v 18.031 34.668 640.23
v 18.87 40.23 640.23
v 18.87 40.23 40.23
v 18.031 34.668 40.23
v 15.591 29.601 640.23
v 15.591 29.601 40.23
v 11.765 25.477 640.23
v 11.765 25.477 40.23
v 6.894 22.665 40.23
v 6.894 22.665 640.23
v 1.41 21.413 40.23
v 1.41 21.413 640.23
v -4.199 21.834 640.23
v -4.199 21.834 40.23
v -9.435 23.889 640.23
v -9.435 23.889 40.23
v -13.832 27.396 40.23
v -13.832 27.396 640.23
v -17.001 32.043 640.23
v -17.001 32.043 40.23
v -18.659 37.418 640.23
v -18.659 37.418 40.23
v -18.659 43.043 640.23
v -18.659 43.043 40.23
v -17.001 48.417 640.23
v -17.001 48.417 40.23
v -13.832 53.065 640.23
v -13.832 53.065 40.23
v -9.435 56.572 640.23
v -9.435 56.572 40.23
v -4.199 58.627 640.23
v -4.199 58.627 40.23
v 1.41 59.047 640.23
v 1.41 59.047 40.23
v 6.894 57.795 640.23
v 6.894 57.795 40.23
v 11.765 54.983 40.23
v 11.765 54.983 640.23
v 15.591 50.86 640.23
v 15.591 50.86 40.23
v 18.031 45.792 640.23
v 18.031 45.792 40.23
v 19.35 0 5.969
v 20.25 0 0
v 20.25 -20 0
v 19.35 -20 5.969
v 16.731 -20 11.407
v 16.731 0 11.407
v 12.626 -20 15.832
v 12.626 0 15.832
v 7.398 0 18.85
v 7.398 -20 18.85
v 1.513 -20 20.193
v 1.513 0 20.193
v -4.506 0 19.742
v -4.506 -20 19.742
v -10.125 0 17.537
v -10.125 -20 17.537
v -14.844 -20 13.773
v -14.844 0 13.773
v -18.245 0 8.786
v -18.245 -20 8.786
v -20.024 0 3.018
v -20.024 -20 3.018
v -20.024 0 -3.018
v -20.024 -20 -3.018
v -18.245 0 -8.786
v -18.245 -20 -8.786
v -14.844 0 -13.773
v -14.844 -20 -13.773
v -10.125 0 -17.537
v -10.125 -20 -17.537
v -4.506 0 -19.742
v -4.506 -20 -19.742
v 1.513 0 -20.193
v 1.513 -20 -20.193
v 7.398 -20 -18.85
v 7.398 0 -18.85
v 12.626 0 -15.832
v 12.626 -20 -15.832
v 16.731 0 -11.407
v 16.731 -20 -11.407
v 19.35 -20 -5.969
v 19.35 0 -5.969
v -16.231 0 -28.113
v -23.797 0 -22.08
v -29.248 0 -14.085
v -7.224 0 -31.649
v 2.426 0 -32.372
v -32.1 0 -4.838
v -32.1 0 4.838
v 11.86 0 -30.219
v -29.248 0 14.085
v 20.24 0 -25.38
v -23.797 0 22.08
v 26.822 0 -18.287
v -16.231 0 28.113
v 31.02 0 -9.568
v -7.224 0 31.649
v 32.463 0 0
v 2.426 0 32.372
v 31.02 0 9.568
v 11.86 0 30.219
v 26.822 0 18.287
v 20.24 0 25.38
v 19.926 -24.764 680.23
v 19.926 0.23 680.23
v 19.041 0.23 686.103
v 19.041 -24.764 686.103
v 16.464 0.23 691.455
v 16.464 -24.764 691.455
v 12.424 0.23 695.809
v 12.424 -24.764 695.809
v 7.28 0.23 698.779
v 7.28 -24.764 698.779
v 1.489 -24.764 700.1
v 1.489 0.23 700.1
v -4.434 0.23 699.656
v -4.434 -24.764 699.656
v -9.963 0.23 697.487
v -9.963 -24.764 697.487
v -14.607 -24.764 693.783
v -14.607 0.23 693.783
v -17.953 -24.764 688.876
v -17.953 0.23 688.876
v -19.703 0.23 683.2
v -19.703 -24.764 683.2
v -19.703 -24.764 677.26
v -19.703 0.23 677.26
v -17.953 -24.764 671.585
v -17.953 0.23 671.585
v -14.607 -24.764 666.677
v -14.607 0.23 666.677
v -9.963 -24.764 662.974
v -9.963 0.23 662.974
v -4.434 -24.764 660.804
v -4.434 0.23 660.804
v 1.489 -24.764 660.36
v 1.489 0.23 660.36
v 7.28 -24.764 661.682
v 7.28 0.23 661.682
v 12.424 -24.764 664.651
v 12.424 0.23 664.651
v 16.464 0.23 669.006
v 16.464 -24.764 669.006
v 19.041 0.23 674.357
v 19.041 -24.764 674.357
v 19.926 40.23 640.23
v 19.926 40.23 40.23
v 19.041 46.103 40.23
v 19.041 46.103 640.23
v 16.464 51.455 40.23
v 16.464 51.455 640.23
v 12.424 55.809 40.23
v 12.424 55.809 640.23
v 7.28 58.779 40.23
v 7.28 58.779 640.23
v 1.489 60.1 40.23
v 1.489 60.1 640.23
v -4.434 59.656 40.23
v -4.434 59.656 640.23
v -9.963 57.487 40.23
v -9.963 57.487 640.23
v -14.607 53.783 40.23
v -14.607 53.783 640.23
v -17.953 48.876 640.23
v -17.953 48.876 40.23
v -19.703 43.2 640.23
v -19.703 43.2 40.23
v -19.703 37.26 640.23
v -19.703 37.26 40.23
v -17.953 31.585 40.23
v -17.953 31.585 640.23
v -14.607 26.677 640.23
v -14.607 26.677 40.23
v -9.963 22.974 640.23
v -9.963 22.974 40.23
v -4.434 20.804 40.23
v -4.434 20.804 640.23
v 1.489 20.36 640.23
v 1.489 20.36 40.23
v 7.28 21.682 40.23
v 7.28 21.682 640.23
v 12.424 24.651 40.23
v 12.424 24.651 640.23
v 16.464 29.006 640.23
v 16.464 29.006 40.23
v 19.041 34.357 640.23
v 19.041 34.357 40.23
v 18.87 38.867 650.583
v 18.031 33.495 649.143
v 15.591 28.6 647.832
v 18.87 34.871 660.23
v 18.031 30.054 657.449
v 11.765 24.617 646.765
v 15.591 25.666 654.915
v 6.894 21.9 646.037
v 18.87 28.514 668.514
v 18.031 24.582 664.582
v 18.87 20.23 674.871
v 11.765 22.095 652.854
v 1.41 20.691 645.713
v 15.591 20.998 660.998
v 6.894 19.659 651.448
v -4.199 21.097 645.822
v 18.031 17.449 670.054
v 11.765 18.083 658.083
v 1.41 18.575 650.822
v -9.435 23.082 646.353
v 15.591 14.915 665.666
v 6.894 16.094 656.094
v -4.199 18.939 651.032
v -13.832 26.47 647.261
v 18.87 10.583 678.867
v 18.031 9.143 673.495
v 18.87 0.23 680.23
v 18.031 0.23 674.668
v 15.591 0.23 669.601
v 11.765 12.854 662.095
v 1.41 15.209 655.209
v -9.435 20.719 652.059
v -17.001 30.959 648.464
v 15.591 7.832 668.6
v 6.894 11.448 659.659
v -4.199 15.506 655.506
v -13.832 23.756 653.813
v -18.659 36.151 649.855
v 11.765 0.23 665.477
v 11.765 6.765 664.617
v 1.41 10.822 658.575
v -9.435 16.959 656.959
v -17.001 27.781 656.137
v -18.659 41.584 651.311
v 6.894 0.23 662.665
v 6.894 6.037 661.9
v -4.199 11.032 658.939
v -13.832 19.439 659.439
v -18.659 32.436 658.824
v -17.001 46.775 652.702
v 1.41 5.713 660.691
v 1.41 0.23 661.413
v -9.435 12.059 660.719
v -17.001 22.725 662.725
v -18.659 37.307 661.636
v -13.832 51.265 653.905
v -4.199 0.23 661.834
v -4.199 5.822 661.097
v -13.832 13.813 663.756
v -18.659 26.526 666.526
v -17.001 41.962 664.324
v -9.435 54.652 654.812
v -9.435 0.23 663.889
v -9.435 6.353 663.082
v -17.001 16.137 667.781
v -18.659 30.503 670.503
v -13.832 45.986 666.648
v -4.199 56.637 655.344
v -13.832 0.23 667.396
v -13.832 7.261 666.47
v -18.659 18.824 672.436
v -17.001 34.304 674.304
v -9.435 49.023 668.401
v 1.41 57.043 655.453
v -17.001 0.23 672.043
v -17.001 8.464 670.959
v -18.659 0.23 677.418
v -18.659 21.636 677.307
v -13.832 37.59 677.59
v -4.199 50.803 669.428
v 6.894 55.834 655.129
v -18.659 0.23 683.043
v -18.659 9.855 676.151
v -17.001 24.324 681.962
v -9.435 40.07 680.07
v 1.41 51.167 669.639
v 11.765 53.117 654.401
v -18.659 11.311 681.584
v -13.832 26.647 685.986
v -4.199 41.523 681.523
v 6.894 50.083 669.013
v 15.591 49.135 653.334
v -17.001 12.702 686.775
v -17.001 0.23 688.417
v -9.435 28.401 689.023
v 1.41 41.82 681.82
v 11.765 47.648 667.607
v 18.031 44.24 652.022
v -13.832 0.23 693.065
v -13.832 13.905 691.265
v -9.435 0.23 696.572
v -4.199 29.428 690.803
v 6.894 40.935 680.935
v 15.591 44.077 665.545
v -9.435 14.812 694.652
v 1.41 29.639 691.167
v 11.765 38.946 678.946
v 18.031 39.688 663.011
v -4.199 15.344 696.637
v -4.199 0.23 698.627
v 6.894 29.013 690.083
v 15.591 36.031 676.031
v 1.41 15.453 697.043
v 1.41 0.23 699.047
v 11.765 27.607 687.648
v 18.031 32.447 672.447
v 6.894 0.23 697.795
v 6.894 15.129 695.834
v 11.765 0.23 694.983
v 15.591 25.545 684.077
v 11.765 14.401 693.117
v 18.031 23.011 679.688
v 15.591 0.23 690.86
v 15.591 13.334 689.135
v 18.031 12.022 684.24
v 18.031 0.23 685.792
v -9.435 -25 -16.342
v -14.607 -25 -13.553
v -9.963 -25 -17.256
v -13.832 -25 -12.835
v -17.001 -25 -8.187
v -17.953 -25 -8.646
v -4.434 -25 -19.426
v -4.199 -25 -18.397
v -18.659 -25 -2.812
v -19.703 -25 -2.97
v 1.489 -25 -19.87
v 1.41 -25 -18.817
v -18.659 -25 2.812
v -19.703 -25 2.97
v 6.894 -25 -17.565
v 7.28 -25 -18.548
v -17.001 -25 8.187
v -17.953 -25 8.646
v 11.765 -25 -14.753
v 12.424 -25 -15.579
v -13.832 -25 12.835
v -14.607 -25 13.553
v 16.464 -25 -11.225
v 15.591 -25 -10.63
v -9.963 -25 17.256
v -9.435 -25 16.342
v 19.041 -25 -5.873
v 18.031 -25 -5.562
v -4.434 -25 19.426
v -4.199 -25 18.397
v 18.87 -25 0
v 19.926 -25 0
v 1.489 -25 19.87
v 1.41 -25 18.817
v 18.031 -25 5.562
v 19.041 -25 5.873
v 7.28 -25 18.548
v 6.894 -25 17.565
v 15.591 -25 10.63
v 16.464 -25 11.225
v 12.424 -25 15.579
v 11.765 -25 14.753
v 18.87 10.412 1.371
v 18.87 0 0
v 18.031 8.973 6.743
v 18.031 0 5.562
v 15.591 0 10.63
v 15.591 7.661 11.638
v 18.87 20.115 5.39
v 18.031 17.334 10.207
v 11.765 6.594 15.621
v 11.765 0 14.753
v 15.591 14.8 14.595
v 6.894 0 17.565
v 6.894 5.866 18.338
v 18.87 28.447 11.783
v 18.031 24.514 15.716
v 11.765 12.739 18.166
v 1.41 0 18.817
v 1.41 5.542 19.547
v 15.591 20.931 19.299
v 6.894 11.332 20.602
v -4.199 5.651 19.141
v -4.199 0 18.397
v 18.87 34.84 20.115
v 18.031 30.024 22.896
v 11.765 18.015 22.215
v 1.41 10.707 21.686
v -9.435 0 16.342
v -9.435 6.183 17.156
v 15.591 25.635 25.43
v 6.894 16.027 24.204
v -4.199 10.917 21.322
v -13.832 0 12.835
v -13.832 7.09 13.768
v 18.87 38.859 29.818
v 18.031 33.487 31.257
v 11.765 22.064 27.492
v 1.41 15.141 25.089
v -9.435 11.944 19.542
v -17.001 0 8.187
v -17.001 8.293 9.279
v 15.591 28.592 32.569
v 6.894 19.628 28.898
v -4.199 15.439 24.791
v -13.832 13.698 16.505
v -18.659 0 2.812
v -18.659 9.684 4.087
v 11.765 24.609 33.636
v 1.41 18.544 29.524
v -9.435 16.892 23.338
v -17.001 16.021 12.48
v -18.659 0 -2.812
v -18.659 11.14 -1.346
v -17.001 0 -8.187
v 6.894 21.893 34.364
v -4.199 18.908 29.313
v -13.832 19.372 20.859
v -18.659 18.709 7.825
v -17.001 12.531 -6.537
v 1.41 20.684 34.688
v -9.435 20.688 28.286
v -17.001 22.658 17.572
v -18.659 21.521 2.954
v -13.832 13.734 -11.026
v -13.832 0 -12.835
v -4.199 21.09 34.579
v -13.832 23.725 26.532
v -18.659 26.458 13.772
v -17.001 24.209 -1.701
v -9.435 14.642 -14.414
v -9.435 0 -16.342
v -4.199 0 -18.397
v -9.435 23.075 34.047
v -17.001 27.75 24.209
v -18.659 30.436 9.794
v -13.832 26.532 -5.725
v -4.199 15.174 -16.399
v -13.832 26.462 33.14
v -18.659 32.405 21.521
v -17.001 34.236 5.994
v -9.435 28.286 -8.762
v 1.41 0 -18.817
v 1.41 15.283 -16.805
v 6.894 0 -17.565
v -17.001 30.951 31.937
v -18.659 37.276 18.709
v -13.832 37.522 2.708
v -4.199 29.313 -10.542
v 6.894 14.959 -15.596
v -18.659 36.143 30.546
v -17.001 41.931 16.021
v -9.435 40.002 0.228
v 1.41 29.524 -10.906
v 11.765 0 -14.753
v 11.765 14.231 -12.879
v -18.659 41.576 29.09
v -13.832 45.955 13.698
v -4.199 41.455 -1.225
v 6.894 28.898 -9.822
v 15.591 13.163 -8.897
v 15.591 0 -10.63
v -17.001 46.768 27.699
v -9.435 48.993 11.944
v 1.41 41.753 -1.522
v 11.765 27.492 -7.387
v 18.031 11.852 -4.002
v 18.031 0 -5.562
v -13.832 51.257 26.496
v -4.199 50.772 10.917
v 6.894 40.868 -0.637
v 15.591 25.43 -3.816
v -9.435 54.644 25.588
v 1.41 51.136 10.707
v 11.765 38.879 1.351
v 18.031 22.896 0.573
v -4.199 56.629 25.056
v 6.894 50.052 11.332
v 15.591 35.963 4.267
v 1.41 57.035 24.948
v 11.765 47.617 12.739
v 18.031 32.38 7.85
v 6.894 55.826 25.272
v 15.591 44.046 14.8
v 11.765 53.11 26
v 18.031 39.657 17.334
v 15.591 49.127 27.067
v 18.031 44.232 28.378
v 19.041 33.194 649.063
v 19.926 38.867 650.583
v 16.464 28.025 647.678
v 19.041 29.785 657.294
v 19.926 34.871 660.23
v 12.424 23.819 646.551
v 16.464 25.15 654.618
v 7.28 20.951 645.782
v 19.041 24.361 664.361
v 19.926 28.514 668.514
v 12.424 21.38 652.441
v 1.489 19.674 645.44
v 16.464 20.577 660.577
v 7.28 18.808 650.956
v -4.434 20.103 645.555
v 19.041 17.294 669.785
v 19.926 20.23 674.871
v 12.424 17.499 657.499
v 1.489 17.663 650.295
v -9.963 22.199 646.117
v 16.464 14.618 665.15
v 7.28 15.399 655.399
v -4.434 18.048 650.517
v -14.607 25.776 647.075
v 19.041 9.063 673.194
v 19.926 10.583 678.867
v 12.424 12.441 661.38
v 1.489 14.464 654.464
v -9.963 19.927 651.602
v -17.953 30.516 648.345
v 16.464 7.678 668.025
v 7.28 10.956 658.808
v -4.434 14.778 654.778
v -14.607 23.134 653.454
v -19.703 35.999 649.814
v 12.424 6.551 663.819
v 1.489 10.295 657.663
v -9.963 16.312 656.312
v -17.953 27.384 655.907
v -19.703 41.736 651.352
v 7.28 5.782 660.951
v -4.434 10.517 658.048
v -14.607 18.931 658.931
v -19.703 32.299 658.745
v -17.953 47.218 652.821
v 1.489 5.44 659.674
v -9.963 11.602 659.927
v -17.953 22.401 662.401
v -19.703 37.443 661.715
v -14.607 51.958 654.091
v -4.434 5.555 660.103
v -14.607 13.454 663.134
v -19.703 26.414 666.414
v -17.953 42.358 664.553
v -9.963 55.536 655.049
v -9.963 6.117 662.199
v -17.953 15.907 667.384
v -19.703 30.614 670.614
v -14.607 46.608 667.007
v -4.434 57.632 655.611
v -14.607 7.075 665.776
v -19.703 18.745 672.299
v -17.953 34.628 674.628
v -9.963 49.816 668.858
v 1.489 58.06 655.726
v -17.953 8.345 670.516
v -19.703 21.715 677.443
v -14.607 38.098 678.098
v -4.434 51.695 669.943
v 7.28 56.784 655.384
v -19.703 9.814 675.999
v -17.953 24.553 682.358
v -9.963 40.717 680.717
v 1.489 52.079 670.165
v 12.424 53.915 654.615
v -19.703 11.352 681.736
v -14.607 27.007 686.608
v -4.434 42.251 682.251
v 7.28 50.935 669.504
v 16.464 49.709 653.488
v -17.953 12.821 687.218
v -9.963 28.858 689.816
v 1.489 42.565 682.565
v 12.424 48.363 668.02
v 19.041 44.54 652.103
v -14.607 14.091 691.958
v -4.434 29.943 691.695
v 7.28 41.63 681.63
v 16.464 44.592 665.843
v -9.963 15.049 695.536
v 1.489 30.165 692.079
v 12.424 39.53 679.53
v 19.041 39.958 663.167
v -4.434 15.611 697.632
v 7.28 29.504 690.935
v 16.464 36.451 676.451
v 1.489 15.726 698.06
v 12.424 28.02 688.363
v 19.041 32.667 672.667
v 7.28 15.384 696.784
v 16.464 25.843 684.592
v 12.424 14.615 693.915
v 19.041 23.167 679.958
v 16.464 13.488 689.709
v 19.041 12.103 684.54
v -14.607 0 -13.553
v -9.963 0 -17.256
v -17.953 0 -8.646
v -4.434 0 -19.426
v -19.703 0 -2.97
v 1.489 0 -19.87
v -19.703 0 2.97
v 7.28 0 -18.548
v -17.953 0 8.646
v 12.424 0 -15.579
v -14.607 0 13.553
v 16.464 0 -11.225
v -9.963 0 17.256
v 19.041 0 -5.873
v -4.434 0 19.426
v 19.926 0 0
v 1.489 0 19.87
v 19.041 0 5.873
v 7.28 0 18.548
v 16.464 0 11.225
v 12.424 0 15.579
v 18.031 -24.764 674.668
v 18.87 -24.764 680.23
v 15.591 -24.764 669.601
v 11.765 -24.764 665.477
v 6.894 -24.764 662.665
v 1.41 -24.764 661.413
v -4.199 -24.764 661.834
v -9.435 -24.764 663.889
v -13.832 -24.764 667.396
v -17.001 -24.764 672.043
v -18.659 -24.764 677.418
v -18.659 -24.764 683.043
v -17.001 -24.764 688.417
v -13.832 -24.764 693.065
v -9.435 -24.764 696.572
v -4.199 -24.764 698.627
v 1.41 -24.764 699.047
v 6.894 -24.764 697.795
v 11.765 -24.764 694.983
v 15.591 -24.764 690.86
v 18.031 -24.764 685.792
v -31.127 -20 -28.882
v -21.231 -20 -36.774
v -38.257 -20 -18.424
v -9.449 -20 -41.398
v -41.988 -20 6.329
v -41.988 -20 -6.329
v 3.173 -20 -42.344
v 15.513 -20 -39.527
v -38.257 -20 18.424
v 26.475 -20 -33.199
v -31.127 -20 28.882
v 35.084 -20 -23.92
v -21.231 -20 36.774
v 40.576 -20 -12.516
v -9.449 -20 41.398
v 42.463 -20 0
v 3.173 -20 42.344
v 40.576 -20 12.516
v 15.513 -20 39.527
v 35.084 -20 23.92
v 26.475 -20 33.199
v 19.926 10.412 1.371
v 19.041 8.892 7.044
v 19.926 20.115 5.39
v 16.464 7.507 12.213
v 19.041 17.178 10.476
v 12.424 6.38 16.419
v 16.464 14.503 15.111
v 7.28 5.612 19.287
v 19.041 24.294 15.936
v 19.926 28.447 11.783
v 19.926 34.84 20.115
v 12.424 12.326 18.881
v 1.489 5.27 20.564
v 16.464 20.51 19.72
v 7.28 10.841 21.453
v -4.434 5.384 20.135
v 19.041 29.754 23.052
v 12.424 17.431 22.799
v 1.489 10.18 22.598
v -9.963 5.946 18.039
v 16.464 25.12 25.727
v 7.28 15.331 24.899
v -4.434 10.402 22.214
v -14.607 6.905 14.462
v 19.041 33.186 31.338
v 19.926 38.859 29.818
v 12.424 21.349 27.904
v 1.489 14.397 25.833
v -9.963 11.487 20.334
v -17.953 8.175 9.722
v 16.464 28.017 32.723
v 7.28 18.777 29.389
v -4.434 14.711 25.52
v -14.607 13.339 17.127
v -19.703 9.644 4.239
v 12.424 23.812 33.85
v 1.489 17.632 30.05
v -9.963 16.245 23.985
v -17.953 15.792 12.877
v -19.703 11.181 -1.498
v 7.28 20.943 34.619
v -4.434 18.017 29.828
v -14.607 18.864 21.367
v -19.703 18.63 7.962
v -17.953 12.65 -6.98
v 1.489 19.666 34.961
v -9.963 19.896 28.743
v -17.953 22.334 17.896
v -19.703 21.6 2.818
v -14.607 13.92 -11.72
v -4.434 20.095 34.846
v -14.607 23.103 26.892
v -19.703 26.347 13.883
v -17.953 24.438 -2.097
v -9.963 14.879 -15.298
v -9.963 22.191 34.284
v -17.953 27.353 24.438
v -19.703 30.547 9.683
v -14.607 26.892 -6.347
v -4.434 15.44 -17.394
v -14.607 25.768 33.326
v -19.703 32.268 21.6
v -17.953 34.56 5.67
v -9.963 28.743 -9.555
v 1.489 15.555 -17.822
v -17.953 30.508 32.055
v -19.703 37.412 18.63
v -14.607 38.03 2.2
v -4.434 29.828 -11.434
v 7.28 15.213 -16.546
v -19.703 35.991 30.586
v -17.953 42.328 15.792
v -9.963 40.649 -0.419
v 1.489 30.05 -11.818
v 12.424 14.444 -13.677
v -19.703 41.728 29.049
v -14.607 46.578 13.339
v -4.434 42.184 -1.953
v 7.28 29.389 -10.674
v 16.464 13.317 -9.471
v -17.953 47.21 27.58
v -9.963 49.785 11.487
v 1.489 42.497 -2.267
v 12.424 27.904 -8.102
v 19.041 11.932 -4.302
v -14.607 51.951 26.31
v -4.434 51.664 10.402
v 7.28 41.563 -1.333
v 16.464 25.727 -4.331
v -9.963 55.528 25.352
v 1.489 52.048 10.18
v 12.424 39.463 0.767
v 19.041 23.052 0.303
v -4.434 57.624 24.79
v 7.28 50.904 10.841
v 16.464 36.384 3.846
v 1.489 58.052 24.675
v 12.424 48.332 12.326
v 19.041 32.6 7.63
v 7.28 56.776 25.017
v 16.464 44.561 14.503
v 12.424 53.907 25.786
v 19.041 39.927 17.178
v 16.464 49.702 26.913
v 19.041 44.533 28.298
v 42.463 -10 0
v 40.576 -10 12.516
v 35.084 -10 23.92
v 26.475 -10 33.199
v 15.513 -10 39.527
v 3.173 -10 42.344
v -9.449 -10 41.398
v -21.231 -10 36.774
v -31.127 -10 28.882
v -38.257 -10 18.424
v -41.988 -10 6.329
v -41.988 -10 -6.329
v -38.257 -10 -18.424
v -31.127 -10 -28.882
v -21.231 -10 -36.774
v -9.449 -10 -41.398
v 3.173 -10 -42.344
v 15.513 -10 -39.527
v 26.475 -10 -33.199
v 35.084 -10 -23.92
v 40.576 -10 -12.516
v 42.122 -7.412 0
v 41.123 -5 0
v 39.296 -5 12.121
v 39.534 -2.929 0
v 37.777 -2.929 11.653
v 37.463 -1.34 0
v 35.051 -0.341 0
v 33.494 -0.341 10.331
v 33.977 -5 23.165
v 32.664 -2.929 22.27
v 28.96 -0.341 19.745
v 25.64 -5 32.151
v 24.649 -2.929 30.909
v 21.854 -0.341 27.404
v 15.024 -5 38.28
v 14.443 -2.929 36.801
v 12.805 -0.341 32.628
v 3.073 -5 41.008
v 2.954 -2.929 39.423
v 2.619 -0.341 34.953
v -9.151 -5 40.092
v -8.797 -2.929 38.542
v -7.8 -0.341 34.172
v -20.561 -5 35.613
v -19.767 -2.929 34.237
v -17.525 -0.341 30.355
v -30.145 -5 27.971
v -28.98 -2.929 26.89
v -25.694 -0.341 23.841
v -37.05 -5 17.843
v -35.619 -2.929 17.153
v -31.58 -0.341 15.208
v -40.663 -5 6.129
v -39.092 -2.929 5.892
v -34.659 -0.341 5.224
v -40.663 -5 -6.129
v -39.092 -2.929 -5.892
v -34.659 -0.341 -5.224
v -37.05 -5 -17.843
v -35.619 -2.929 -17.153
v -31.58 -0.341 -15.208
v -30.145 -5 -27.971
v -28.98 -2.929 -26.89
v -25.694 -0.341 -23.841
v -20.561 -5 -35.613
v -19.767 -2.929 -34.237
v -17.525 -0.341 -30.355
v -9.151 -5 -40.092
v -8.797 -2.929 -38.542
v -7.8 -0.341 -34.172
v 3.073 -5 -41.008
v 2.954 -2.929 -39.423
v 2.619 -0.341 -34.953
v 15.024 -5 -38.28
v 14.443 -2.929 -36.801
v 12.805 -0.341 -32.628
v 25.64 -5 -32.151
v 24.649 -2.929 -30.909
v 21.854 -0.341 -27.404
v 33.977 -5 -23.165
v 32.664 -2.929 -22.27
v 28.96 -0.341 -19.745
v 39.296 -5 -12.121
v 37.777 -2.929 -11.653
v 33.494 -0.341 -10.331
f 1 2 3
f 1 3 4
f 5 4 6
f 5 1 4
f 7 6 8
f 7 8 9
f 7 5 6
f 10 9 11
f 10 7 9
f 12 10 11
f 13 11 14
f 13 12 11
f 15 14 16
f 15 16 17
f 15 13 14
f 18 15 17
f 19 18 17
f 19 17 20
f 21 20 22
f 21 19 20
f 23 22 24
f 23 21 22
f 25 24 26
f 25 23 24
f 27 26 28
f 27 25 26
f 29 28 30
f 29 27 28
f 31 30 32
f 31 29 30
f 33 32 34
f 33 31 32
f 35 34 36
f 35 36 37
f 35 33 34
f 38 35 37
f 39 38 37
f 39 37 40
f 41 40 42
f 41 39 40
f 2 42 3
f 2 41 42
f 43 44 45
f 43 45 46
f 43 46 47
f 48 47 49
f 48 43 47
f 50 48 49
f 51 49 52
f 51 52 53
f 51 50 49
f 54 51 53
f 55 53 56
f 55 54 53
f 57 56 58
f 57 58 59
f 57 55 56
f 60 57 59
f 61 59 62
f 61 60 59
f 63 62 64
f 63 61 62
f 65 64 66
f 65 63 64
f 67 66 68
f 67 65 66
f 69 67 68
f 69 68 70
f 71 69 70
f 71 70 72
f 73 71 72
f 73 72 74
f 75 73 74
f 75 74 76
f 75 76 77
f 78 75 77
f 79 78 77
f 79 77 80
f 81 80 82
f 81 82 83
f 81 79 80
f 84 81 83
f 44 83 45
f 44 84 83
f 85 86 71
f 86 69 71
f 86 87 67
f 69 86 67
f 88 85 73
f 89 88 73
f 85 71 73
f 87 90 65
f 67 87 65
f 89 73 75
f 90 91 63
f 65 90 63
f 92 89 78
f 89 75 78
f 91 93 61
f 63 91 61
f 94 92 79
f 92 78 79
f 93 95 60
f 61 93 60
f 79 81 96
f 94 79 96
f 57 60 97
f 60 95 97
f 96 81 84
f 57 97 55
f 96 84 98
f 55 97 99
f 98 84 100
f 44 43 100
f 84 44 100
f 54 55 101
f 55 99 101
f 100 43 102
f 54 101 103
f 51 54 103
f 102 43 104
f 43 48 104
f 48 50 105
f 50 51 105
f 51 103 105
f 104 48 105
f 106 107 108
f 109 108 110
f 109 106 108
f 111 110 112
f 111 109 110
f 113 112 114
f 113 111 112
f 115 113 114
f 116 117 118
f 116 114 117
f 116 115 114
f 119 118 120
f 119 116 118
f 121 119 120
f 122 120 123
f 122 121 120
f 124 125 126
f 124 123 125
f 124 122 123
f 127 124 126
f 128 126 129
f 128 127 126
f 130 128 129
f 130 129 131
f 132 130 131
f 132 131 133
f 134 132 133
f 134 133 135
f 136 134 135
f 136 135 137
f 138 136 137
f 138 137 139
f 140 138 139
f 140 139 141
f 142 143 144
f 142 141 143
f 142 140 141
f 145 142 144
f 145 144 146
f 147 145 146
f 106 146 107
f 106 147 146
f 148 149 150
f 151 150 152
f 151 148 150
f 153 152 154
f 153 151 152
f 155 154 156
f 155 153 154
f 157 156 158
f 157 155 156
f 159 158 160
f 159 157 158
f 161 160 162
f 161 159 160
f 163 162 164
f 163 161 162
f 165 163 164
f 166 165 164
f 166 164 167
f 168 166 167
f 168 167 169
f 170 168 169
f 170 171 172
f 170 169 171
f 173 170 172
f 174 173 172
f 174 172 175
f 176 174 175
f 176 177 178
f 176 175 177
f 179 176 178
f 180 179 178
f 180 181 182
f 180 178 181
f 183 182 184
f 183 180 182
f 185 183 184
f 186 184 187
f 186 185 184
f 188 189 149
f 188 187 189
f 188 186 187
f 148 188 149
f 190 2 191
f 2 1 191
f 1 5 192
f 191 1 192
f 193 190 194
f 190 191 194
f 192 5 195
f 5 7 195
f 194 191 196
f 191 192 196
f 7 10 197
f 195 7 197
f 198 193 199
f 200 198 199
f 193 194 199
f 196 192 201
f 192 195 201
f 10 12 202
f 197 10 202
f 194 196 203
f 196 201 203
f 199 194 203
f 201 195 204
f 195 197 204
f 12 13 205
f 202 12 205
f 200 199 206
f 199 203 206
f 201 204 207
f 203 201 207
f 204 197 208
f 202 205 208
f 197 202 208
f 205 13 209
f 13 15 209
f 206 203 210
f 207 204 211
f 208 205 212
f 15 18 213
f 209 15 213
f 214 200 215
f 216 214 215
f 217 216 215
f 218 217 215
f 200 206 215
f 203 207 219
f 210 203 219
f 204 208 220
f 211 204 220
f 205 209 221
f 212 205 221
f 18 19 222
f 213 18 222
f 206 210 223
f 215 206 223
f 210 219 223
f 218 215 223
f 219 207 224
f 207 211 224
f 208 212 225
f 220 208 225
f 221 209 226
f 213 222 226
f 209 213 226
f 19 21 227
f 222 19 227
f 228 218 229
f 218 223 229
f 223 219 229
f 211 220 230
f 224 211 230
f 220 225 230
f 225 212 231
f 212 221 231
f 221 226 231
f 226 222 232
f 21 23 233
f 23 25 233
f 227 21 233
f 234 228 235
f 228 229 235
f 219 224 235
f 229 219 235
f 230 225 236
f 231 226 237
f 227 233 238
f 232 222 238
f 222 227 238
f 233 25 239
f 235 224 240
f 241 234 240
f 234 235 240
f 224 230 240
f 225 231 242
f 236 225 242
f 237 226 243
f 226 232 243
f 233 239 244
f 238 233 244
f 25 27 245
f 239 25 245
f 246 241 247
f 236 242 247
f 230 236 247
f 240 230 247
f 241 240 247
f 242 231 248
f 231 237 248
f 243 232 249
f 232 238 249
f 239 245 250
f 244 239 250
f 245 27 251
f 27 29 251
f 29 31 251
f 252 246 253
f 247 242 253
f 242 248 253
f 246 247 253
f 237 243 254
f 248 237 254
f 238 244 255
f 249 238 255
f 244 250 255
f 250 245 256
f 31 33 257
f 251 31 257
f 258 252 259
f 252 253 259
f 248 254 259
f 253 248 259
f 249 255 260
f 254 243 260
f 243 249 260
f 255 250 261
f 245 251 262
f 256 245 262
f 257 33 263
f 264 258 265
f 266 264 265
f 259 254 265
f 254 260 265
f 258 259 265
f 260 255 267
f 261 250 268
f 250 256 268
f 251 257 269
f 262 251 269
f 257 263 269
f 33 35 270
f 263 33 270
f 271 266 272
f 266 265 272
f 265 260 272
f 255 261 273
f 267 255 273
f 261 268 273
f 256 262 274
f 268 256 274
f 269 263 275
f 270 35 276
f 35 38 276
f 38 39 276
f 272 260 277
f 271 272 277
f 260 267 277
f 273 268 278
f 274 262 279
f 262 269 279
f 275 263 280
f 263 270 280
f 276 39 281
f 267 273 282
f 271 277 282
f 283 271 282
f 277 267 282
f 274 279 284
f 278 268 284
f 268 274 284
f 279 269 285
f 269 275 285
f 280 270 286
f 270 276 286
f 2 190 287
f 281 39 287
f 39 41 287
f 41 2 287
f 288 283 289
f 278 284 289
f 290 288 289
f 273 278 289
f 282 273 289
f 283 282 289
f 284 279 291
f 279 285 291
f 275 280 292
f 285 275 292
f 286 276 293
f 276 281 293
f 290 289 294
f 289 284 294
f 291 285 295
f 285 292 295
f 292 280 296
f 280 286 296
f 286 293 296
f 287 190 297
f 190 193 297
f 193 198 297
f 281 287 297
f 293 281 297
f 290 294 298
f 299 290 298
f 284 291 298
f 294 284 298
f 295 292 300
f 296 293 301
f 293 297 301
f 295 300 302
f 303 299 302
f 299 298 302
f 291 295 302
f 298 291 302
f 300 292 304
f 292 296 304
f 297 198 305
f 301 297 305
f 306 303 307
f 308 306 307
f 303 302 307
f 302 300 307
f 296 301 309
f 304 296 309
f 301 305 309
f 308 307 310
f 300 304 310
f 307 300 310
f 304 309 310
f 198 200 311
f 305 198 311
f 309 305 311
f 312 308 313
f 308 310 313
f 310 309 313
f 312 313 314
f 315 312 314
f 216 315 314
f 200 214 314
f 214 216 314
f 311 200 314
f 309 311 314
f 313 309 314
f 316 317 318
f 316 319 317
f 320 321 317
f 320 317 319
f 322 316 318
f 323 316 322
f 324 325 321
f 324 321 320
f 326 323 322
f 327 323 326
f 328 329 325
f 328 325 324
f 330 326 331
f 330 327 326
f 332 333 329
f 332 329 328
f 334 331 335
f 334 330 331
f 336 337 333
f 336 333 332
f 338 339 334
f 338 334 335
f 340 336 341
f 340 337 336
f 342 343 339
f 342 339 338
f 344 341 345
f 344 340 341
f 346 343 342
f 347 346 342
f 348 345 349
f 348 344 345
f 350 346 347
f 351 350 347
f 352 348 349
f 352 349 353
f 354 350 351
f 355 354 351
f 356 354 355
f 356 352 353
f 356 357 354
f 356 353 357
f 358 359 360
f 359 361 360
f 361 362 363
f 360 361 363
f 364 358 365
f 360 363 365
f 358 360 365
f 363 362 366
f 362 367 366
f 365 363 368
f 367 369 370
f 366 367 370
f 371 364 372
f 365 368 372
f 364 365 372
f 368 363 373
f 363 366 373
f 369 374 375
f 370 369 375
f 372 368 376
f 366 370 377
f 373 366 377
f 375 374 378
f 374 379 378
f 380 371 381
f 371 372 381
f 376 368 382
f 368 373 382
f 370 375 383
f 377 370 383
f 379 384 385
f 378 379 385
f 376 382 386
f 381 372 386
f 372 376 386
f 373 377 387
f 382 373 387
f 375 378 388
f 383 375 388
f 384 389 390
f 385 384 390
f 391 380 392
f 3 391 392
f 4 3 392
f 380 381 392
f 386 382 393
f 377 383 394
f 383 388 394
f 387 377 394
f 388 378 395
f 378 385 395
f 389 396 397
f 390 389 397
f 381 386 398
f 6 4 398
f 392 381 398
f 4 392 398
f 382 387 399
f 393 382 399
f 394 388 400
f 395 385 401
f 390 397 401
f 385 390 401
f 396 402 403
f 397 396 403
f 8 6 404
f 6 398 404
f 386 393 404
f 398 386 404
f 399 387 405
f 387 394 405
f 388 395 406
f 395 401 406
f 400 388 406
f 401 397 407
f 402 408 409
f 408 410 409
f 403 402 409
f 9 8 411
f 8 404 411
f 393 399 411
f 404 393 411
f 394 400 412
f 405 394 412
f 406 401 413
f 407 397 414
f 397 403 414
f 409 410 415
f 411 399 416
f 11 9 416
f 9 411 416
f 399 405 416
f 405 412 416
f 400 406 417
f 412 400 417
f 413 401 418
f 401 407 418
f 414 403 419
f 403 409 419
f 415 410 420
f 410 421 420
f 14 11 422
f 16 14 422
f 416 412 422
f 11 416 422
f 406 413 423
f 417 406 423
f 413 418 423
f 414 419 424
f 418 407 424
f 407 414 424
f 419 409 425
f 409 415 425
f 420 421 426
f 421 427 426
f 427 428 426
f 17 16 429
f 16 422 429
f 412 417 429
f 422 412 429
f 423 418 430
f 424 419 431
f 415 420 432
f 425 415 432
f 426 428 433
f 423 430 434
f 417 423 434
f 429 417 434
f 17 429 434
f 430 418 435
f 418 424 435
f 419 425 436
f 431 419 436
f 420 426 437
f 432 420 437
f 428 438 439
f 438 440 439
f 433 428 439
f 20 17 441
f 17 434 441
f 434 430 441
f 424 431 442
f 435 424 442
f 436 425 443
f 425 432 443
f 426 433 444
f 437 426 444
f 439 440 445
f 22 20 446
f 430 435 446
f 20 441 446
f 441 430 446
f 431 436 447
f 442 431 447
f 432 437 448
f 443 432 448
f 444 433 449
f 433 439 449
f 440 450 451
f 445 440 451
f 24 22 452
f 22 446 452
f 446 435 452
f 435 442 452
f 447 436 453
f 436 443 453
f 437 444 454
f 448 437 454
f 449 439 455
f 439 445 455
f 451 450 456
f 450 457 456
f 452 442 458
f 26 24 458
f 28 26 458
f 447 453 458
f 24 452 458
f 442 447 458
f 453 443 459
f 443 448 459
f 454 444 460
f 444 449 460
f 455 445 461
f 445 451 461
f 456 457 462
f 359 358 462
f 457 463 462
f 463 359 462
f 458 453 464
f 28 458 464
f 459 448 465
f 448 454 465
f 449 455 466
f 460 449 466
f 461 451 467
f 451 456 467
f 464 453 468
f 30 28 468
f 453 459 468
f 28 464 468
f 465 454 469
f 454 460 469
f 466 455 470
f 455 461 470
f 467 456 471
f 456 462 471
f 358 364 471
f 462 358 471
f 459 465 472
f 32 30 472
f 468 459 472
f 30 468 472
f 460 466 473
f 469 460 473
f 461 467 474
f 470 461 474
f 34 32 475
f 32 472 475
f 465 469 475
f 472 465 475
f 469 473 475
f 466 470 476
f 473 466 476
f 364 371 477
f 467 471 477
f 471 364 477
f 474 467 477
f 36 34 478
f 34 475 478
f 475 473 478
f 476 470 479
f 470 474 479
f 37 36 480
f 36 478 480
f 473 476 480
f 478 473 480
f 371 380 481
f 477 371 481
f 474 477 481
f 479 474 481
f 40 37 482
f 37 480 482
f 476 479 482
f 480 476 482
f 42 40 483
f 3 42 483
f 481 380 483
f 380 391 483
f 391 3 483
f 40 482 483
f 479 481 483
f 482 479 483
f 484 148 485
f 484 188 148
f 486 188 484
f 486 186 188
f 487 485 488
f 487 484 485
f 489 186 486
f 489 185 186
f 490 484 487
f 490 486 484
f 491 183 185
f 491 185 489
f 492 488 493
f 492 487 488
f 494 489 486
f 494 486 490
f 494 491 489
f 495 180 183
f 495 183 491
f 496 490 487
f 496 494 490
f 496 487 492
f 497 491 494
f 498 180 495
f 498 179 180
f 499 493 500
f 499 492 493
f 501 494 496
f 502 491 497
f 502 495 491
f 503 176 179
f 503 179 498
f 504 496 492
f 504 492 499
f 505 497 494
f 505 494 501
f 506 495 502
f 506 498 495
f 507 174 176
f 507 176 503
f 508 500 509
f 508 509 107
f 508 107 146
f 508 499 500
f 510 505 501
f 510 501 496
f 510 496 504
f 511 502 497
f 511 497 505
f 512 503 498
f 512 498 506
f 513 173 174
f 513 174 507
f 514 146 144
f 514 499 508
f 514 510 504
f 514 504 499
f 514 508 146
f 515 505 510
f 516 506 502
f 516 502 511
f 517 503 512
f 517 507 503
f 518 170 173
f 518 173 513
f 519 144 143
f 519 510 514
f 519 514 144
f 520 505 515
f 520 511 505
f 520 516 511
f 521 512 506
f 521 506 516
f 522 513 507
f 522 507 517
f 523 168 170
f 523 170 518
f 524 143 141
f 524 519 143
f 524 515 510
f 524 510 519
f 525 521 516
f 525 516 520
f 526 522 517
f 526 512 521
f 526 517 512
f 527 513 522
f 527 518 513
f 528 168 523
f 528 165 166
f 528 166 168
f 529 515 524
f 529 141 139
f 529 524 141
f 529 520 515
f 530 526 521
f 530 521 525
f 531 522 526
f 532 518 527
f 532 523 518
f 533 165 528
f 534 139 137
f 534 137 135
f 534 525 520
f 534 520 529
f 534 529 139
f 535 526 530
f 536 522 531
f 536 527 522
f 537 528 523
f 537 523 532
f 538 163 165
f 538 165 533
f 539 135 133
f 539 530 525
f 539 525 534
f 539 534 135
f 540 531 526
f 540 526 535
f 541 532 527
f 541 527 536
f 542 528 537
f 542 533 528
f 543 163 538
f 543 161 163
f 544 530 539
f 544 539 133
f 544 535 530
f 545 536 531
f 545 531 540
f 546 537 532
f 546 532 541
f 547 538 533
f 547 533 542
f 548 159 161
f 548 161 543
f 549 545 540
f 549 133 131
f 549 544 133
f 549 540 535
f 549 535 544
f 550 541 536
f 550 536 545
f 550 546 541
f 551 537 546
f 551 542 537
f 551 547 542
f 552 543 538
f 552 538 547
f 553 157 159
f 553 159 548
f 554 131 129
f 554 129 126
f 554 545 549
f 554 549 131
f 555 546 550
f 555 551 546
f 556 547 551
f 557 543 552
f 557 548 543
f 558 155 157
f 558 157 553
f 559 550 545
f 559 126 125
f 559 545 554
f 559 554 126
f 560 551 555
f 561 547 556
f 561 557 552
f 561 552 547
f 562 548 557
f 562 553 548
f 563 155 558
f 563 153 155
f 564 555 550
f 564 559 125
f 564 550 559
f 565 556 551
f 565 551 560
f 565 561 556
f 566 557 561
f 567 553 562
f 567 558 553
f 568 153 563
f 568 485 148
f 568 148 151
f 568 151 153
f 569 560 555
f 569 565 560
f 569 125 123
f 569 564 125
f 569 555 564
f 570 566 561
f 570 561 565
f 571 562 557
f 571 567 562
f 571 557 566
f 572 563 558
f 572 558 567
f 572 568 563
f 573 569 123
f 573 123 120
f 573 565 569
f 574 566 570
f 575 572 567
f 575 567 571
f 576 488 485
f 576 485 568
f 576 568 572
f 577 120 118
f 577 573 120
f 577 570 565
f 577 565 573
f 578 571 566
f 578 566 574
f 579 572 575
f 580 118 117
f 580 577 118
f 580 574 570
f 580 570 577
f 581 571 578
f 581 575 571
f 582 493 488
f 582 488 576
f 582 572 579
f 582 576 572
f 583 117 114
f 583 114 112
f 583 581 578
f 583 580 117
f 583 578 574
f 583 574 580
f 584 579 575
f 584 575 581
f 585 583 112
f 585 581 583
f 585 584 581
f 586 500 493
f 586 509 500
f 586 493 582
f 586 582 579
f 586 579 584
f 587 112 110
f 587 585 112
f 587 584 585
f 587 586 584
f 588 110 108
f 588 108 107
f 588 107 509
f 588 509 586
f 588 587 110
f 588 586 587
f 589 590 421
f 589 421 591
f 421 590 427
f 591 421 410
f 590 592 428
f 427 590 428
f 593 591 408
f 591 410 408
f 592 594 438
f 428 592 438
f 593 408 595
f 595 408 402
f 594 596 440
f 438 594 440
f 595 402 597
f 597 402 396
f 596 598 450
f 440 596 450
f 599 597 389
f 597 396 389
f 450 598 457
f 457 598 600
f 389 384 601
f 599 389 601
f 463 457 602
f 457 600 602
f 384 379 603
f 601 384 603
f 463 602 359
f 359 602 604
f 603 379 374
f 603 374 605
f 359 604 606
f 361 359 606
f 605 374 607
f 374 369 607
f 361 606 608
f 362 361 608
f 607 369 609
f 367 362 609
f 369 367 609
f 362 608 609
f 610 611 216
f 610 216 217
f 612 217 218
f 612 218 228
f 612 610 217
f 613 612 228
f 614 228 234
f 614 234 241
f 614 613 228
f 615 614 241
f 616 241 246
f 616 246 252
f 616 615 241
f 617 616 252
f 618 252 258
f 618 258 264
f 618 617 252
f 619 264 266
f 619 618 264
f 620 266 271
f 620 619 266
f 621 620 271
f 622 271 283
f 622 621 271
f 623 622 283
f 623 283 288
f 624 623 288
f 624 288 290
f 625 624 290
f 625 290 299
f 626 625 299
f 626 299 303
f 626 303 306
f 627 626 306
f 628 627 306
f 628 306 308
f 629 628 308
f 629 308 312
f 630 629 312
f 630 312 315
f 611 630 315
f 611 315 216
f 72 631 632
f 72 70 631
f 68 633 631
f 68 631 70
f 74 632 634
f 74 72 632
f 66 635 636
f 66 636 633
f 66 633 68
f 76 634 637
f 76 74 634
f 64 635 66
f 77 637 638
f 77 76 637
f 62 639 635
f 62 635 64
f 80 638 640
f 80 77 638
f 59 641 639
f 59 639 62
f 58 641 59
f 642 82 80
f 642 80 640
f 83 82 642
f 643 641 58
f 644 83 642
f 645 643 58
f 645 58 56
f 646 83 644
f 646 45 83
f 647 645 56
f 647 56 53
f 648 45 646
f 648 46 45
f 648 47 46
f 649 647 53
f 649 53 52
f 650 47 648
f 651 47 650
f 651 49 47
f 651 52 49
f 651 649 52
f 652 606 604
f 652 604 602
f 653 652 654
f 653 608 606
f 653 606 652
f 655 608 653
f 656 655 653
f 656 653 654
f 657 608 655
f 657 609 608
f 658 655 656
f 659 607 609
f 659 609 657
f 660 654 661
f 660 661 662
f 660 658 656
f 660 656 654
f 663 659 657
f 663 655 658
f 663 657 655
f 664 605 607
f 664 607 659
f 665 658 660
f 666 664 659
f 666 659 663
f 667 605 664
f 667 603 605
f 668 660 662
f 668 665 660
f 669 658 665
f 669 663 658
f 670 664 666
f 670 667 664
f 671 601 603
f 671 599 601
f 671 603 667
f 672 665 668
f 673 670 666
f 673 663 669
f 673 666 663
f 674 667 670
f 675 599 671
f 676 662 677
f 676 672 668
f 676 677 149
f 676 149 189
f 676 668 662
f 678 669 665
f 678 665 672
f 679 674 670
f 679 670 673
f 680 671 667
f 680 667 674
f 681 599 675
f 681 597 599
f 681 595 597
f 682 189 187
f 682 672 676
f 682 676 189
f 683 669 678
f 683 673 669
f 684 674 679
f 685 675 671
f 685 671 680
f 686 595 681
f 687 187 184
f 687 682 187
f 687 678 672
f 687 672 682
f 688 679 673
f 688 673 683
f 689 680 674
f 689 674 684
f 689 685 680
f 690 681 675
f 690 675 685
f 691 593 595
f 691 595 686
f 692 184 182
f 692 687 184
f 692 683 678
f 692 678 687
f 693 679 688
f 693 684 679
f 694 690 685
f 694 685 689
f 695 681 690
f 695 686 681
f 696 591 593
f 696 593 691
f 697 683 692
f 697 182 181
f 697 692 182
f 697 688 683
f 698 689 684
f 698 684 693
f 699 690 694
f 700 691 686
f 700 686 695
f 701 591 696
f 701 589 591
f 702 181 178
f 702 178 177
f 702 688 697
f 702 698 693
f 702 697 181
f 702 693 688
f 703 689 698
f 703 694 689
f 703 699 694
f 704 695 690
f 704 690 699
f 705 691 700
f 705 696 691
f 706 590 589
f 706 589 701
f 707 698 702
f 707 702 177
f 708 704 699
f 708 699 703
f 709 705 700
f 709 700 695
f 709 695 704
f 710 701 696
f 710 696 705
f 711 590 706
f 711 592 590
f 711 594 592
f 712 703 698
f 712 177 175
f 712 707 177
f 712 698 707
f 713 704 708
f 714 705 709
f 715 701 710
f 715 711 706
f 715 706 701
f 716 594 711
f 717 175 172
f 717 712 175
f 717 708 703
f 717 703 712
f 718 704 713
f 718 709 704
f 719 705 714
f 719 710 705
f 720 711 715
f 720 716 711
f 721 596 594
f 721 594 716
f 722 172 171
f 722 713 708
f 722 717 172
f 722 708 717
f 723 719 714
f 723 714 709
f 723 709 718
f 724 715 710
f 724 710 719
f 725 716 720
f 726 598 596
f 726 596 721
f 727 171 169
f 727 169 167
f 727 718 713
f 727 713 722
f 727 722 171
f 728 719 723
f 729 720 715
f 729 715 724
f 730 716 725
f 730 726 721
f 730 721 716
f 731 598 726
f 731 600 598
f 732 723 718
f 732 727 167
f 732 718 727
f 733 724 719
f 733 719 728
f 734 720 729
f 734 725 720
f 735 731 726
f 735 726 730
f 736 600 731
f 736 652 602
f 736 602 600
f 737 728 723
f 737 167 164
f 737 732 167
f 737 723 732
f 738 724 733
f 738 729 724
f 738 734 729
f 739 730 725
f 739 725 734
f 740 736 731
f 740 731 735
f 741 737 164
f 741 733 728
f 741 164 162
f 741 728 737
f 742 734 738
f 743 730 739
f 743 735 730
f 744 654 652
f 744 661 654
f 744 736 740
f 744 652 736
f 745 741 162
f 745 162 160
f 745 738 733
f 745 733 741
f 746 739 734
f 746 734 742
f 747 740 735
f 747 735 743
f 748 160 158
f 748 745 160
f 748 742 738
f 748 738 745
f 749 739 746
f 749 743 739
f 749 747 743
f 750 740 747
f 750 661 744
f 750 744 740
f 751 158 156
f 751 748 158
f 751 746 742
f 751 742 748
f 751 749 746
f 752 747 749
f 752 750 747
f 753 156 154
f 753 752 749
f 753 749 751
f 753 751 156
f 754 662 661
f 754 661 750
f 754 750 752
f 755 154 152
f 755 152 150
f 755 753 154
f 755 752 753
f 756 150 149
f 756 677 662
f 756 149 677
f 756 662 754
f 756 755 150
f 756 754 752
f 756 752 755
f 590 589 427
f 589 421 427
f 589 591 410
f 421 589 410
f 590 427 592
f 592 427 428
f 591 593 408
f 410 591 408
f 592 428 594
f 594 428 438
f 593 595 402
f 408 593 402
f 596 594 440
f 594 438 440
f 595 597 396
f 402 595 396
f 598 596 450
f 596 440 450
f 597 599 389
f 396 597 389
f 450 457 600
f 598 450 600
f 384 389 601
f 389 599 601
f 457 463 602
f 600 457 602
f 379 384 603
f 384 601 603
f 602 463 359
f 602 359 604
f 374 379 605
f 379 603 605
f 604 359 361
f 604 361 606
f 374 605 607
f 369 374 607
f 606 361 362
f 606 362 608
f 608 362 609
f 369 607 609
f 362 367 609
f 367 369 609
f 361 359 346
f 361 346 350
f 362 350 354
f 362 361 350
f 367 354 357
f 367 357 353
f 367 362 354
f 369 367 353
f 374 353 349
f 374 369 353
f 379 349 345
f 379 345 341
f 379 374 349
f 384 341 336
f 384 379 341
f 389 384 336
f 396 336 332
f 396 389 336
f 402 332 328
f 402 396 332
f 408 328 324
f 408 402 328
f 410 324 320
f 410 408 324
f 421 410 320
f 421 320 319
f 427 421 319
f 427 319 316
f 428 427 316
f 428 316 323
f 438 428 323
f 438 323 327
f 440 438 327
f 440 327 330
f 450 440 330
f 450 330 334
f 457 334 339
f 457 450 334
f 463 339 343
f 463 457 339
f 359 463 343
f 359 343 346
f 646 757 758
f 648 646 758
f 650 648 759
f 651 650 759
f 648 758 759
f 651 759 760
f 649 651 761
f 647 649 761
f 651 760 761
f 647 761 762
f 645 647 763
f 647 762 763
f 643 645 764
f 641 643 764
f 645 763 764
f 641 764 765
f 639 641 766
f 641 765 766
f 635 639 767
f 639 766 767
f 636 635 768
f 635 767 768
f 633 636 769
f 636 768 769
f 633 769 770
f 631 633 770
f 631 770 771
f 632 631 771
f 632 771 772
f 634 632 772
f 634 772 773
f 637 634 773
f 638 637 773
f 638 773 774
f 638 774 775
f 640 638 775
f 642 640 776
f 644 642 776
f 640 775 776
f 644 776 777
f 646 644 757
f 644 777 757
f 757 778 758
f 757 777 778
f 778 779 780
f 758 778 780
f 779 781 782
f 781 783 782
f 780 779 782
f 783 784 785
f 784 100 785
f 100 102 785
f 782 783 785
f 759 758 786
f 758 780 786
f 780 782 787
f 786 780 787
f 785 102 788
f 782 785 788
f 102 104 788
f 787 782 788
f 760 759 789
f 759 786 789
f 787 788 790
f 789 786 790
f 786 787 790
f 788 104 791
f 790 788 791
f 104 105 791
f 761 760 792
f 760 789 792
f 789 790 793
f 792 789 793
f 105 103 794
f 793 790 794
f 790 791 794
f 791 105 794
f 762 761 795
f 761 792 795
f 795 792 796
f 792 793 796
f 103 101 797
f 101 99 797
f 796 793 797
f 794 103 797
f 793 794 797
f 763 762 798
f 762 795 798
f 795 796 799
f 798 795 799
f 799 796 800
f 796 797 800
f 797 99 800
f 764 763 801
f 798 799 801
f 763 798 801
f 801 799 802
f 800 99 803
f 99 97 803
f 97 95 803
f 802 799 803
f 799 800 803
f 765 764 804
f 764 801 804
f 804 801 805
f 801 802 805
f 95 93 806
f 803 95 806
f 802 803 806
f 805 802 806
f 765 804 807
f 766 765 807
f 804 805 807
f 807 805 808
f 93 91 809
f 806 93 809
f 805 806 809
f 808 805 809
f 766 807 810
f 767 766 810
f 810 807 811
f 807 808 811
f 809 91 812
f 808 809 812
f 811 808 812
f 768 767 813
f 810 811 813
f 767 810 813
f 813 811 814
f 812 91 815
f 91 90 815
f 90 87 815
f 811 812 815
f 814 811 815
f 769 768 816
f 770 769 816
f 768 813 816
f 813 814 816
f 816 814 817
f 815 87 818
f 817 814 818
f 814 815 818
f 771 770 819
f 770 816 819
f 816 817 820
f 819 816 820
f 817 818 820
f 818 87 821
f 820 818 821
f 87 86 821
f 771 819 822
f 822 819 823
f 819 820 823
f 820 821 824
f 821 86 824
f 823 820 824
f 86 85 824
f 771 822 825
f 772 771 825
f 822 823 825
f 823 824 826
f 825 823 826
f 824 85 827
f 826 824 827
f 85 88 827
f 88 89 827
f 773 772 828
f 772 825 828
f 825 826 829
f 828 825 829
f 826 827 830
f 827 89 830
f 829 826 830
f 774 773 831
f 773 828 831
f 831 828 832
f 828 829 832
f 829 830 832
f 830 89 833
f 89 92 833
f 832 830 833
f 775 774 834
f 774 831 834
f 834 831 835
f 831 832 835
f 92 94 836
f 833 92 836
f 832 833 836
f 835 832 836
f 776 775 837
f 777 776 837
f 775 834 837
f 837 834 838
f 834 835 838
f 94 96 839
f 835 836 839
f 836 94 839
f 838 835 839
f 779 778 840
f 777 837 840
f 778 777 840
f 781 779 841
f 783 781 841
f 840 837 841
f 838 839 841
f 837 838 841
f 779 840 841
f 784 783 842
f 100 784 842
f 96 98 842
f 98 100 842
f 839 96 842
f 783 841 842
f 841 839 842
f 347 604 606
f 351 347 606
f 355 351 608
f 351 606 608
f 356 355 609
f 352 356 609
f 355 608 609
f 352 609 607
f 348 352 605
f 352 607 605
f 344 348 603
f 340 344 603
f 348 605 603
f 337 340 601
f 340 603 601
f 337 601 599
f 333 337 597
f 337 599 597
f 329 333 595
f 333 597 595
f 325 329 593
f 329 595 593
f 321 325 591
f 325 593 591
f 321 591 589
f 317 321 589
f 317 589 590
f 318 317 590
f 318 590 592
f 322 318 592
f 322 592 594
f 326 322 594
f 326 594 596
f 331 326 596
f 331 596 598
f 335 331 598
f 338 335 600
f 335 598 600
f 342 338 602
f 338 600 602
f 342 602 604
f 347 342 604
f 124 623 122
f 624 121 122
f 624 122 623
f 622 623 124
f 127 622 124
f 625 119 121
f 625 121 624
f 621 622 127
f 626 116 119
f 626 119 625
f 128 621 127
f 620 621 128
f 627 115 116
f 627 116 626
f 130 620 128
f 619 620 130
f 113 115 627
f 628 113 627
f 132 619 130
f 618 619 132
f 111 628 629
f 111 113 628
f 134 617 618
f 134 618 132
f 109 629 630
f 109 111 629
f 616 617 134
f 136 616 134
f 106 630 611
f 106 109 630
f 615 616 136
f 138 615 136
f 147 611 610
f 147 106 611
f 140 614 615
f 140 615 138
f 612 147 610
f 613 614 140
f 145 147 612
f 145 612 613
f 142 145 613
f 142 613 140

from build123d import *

# Parameters (mm, degrees)
F0_R        = 19.9259
F0_R_2      = 18.869668
F2_DEPTH    = 25
F2_FACE_R   = 19.9259
F2_FACE_R_2 = 18.869668
F4_R        = 42.462527
F4_R_2      = 20.25
F5_DEPTH    = 20
F6_R        = 10


with BuildPart() as f2:
    # F0 (on Front) → F2 (new body)
    with BuildSketch(Plane.XZ):
        Circle(F0_R)
        Circle(F0_R_2, mode=Mode.SUBTRACT)
    extrude(amount=F2_DEPTH)


with BuildPart() as f3:
    # F3: sweep along a path in F1
    with BuildLine(Plane.YZ) as f3_path:
        ThreePointArc((0, 0), (28.447035, 11.783148), (40.230183, 40.230183))
        Line((40.230183, 40.230183), (40.230183, 640.230183))
        ThreePointArc((40.230183, 640.230183), (28.514451, 668.514453), (0.230179, 680.230179))
        Line((0.230179, 680.230179), (-24.763696, 680.230176))
    # F2_face (on face) → F3 (sweep)
    with BuildSketch(Plane(origin=(0, 0, 0), x_dir=(1, 0, 0), z_dir=(0, 1, 0))):
        Circle(F2_FACE_R)
        Circle(F2_FACE_R_2, mode=Mode.SUBTRACT)
    sweep(path=f3_path.line)


with BuildPart() as f5:
    # F4 (on Front) → F5 (new body)
    with BuildSketch(Plane.XZ):
        Circle(F4_R)
        Circle(F4_R_2, mode=Mode.SUBTRACT)
    extrude(amount=F5_DEPTH)

    # F6
    f6_edges = [f5.edges().sort_by_distance(p)[0] for p in [
        (-42.462527, 0, 0),
    ]]
    fillet(f6_edges, radius=F6_R)


solid = Compound([f2.part, f3.part, f5.part])
